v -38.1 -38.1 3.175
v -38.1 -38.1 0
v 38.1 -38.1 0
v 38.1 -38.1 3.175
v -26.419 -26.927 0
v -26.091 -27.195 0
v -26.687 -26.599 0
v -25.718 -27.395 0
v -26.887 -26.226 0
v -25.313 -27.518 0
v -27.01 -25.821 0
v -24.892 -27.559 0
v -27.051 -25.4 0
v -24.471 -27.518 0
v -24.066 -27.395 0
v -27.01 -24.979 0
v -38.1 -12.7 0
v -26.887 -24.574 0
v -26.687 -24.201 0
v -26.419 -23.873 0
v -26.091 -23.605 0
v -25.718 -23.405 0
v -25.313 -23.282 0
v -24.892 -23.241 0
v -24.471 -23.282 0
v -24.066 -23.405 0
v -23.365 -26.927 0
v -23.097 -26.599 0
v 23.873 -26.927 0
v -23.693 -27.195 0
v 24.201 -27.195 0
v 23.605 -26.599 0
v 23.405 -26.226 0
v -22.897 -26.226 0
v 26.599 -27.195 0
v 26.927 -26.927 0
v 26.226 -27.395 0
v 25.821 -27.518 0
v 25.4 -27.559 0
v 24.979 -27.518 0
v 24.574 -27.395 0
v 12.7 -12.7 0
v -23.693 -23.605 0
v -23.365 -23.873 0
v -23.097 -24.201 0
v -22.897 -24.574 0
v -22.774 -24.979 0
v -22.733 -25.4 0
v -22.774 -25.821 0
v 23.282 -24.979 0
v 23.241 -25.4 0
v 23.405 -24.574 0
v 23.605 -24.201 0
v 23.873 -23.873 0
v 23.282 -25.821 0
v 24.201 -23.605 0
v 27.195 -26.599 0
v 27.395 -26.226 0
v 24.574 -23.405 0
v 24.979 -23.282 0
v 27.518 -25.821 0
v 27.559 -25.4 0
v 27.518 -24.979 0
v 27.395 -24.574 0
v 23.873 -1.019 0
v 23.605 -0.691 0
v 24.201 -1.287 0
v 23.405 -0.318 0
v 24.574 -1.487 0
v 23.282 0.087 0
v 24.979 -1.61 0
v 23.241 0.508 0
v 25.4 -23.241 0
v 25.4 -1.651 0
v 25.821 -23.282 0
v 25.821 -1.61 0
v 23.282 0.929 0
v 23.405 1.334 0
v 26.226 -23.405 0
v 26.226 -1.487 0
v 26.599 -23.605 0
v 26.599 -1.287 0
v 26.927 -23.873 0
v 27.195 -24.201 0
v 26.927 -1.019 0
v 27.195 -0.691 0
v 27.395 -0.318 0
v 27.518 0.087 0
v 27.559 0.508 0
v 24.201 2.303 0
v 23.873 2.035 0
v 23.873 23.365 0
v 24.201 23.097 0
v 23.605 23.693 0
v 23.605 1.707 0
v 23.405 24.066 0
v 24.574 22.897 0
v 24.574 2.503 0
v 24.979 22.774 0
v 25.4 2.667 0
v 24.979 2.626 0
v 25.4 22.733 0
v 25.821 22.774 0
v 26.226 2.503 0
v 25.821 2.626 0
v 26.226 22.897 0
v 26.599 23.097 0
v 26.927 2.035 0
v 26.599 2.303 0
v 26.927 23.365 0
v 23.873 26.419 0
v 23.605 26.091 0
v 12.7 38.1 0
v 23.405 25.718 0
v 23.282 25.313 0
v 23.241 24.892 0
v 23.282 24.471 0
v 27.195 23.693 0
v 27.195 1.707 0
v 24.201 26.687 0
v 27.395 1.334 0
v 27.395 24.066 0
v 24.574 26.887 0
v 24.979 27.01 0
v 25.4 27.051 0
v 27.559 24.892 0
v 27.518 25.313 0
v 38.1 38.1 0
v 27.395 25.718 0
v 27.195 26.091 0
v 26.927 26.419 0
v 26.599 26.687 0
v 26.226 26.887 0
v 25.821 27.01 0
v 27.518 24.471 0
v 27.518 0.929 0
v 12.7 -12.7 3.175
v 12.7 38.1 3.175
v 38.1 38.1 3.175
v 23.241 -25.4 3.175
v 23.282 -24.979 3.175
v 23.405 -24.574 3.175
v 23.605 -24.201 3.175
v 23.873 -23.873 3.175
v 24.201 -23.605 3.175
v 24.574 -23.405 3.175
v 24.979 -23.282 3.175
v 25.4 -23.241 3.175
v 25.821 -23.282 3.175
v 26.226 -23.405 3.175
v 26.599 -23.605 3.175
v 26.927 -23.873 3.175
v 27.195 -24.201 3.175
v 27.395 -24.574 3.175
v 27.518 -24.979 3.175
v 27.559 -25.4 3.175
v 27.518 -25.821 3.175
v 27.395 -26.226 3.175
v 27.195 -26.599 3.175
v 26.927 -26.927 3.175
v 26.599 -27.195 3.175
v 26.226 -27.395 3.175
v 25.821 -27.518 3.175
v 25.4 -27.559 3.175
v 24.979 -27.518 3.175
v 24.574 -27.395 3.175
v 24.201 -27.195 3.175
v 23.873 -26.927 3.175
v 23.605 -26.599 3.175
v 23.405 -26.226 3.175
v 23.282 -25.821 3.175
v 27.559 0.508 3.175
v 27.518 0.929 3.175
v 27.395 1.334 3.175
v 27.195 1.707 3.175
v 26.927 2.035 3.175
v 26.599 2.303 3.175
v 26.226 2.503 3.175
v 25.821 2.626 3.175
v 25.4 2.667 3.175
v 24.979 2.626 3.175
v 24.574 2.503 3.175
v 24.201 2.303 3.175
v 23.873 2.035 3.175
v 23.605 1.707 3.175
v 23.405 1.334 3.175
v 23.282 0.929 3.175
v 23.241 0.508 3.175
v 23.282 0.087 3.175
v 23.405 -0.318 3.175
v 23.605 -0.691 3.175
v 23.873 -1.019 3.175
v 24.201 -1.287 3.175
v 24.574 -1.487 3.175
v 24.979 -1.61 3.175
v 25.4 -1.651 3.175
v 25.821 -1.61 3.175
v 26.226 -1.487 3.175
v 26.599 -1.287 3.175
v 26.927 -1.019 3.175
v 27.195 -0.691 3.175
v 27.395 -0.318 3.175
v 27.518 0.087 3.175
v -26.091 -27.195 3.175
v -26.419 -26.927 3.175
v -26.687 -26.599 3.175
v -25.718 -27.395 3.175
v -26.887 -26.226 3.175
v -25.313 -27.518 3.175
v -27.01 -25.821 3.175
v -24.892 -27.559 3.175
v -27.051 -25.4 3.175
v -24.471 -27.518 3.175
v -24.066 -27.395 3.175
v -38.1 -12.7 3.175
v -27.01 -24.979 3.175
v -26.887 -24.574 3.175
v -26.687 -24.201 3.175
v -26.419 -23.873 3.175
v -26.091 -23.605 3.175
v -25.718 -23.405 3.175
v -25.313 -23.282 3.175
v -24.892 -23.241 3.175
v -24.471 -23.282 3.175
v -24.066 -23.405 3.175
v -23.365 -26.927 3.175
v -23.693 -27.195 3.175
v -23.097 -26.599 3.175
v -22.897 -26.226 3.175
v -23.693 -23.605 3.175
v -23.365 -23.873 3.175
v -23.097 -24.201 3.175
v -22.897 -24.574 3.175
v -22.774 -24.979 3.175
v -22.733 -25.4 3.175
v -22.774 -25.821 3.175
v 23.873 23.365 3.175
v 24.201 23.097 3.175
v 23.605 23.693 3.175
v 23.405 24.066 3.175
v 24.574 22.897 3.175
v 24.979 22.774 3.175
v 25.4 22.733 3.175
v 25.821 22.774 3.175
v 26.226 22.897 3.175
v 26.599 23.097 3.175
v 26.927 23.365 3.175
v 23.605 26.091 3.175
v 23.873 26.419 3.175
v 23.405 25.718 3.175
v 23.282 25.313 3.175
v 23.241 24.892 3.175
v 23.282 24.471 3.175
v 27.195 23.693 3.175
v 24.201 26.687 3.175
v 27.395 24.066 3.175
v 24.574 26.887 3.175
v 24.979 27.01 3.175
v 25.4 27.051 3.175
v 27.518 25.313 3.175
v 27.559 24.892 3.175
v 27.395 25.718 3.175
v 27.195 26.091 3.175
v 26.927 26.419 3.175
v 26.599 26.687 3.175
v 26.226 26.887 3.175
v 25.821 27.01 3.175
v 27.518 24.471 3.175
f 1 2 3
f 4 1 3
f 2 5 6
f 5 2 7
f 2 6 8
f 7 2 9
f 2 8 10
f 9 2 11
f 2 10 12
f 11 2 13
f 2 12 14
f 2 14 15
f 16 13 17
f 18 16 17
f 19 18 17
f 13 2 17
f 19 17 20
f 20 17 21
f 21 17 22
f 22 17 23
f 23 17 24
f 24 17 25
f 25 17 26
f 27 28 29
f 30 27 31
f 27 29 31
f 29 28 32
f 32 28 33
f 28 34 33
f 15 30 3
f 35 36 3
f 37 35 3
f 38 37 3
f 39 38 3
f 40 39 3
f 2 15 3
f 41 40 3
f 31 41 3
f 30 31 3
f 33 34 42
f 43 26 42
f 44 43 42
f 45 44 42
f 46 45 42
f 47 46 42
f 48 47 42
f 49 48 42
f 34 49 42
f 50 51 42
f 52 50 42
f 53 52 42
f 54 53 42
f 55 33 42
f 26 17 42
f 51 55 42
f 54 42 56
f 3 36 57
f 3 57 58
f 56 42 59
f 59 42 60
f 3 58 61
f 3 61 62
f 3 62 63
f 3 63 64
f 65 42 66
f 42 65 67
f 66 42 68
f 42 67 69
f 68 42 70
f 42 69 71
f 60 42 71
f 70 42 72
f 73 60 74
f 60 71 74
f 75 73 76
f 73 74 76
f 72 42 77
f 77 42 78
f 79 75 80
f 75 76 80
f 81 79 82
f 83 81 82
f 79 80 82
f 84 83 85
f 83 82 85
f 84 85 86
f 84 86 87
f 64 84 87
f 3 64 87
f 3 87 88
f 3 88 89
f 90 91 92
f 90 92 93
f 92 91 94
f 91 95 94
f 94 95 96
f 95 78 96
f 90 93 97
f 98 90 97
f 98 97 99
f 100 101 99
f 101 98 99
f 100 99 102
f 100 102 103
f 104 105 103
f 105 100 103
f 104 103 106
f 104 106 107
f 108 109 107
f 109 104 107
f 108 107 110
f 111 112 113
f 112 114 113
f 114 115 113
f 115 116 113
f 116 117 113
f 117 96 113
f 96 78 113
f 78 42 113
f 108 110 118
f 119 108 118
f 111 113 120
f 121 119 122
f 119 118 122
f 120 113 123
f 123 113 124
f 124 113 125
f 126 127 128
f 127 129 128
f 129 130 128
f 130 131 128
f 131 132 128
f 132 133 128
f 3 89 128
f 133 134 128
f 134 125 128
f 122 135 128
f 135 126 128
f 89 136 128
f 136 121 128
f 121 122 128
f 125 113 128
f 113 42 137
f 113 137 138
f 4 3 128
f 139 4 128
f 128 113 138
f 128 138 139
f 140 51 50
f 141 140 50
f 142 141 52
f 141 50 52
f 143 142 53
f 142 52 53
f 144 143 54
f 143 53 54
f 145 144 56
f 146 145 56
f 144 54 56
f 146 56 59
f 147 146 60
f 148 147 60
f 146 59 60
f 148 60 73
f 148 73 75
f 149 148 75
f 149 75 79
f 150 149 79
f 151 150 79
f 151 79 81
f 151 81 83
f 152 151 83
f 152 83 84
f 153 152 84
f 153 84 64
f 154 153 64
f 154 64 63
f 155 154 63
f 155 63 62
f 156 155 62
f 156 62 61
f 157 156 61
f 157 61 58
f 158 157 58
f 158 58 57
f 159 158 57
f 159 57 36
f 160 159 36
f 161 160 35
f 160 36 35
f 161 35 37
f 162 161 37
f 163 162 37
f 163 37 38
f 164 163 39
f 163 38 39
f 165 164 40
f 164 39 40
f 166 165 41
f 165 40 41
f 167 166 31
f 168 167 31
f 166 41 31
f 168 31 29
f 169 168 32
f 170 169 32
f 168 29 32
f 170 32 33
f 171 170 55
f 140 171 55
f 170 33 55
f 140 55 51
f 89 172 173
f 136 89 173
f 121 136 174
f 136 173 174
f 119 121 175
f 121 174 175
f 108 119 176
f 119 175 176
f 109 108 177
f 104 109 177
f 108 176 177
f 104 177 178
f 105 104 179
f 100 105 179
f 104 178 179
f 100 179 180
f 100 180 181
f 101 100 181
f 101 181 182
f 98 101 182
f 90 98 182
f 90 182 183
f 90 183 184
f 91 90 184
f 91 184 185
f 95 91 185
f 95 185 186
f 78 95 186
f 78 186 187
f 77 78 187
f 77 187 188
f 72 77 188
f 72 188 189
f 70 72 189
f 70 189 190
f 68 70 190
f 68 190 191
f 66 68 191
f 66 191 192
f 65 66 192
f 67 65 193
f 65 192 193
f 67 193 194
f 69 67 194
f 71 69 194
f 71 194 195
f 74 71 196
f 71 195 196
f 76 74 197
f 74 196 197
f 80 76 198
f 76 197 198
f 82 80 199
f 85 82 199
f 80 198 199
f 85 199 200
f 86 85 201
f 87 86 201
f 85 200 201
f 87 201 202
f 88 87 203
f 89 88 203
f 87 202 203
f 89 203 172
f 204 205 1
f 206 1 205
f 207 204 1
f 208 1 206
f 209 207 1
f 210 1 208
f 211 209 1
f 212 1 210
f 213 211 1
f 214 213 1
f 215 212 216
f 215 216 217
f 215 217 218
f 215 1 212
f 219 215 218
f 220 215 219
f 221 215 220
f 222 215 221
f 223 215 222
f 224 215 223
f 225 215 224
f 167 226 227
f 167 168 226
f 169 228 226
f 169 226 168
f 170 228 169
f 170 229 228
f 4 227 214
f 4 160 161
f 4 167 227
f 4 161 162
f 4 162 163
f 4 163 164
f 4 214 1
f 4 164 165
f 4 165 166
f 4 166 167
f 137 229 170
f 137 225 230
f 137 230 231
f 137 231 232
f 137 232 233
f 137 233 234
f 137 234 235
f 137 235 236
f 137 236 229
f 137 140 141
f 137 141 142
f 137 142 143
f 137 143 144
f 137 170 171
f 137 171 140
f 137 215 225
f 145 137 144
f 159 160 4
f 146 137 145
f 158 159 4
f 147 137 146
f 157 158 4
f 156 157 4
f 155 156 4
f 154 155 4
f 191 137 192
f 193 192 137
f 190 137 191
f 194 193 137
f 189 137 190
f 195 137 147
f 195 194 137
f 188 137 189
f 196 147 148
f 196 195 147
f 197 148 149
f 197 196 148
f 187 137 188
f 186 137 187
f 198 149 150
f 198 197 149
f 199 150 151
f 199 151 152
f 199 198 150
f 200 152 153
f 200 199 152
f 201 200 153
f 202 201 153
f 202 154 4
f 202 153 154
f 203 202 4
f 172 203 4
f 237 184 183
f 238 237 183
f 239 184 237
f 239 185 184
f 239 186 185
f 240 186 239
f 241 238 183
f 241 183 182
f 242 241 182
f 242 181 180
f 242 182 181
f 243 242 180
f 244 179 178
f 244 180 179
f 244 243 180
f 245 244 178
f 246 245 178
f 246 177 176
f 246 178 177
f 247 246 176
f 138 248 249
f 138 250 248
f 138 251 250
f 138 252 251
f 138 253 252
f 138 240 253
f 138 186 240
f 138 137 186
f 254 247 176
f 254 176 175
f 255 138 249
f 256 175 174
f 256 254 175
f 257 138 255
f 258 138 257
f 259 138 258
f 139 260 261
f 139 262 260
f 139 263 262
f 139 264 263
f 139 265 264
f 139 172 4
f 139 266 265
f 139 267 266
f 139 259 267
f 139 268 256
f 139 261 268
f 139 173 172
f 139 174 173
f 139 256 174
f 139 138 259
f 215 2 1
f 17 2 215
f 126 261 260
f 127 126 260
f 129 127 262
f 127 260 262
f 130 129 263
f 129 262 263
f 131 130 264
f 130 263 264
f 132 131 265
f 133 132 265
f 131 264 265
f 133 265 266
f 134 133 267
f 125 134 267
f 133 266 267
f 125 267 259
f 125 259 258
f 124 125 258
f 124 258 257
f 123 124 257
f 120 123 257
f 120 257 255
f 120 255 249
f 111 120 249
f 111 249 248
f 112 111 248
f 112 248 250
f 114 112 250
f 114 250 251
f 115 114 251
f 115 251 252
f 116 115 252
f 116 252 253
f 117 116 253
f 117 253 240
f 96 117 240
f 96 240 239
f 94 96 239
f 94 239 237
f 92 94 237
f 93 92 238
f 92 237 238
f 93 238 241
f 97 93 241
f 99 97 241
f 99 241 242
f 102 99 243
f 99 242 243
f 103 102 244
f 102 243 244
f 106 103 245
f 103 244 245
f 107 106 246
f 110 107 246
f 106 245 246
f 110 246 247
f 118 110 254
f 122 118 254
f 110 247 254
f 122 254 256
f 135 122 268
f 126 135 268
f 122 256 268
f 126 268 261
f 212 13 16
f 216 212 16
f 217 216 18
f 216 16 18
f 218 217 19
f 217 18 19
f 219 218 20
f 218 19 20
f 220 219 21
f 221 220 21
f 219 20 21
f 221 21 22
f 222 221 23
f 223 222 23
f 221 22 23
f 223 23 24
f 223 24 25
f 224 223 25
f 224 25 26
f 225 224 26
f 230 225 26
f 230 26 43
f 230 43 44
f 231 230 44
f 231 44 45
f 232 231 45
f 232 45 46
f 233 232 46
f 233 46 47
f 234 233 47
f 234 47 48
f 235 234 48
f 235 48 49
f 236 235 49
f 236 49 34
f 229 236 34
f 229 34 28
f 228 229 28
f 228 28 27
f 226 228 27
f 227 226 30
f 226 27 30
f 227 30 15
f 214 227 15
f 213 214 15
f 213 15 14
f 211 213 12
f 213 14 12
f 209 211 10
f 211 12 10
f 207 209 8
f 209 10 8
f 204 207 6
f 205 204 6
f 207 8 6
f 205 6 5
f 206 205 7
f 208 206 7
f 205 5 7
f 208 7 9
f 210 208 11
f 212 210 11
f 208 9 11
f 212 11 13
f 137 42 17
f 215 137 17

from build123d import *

# Parameters (mm, degrees)
SKETCH1_W           = 76.2
SKETCH1_H           = 76.2
BOSS_EXTRUDE1_DEPTH = 3.175
SKETCH2_W           = 50.8
SKETCH2_H           = 50.8
CUT_EXTRUDE1_DEPTH  = 6.35
SKETCH3_R           = 2.159
CUT_EXTRUDE2_DEPTH  = 6.35
SKETCH5_R           = 2.159
CUT_EXTRUDE3_DEPTH  = 6.35
SKETCH6_R           = 2.159
CUT_EXTRUDE4_DEPTH  = 54.975


with BuildPart() as part:
    # Sketch1 → Boss-Extrude1 (new body)
    with BuildSketch(Plane.XY):
        Rectangle(SKETCH1_W, SKETCH1_H)
    extrude(amount=BOSS_EXTRUDE1_DEPTH)

    # Sketch2 → Cut-Extrude1 (cut)
    with BuildSketch(Plane(origin=(0, 0, 0), x_dir=(-1, 0, 0), z_dir=(0, 0, -1))):
        with Locations((12.7, 12.7)):
            Rectangle(SKETCH2_W, SKETCH2_H)
    extrude(amount=-CUT_EXTRUDE1_DEPTH, mode=Mode.SUBTRACT)

    # Sketch3 → Cut-Extrude2 (cut)
    with BuildSketch(Plane(origin=(0, 0, 0), x_dir=(-1, 0, 0), z_dir=(0, 0, -1))):
        with Locations((-25.4, -25.4)):
            Circle(SKETCH3_R)
    extrude(amount=-CUT_EXTRUDE2_DEPTH, mode=Mode.SUBTRACT)

    # Sketch5 → Cut-Extrude3 (cut)
    with BuildSketch(Plane(origin=(0, 0, 0), x_dir=(-1, 0, 0), z_dir=(0, 0, -1))):
        with Locations((24.892, -25.4)):
            Circle(SKETCH5_R)
    extrude(amount=-CUT_EXTRUDE3_DEPTH, mode=Mode.SUBTRACT)

    # Sketch6 → Cut-Extrude4 (cut, through all)
    with BuildSketch(Plane.XY.offset(3.175)):
        with Locations((25.4, 0.508)):
            Circle(SKETCH6_R)
        with Locations((25.4, 24.892)):
            Circle(SKETCH6_R)
    extrude(amount=-CUT_EXTRUDE4_DEPTH, mode=Mode.SUBTRACT)


solid = part.part
